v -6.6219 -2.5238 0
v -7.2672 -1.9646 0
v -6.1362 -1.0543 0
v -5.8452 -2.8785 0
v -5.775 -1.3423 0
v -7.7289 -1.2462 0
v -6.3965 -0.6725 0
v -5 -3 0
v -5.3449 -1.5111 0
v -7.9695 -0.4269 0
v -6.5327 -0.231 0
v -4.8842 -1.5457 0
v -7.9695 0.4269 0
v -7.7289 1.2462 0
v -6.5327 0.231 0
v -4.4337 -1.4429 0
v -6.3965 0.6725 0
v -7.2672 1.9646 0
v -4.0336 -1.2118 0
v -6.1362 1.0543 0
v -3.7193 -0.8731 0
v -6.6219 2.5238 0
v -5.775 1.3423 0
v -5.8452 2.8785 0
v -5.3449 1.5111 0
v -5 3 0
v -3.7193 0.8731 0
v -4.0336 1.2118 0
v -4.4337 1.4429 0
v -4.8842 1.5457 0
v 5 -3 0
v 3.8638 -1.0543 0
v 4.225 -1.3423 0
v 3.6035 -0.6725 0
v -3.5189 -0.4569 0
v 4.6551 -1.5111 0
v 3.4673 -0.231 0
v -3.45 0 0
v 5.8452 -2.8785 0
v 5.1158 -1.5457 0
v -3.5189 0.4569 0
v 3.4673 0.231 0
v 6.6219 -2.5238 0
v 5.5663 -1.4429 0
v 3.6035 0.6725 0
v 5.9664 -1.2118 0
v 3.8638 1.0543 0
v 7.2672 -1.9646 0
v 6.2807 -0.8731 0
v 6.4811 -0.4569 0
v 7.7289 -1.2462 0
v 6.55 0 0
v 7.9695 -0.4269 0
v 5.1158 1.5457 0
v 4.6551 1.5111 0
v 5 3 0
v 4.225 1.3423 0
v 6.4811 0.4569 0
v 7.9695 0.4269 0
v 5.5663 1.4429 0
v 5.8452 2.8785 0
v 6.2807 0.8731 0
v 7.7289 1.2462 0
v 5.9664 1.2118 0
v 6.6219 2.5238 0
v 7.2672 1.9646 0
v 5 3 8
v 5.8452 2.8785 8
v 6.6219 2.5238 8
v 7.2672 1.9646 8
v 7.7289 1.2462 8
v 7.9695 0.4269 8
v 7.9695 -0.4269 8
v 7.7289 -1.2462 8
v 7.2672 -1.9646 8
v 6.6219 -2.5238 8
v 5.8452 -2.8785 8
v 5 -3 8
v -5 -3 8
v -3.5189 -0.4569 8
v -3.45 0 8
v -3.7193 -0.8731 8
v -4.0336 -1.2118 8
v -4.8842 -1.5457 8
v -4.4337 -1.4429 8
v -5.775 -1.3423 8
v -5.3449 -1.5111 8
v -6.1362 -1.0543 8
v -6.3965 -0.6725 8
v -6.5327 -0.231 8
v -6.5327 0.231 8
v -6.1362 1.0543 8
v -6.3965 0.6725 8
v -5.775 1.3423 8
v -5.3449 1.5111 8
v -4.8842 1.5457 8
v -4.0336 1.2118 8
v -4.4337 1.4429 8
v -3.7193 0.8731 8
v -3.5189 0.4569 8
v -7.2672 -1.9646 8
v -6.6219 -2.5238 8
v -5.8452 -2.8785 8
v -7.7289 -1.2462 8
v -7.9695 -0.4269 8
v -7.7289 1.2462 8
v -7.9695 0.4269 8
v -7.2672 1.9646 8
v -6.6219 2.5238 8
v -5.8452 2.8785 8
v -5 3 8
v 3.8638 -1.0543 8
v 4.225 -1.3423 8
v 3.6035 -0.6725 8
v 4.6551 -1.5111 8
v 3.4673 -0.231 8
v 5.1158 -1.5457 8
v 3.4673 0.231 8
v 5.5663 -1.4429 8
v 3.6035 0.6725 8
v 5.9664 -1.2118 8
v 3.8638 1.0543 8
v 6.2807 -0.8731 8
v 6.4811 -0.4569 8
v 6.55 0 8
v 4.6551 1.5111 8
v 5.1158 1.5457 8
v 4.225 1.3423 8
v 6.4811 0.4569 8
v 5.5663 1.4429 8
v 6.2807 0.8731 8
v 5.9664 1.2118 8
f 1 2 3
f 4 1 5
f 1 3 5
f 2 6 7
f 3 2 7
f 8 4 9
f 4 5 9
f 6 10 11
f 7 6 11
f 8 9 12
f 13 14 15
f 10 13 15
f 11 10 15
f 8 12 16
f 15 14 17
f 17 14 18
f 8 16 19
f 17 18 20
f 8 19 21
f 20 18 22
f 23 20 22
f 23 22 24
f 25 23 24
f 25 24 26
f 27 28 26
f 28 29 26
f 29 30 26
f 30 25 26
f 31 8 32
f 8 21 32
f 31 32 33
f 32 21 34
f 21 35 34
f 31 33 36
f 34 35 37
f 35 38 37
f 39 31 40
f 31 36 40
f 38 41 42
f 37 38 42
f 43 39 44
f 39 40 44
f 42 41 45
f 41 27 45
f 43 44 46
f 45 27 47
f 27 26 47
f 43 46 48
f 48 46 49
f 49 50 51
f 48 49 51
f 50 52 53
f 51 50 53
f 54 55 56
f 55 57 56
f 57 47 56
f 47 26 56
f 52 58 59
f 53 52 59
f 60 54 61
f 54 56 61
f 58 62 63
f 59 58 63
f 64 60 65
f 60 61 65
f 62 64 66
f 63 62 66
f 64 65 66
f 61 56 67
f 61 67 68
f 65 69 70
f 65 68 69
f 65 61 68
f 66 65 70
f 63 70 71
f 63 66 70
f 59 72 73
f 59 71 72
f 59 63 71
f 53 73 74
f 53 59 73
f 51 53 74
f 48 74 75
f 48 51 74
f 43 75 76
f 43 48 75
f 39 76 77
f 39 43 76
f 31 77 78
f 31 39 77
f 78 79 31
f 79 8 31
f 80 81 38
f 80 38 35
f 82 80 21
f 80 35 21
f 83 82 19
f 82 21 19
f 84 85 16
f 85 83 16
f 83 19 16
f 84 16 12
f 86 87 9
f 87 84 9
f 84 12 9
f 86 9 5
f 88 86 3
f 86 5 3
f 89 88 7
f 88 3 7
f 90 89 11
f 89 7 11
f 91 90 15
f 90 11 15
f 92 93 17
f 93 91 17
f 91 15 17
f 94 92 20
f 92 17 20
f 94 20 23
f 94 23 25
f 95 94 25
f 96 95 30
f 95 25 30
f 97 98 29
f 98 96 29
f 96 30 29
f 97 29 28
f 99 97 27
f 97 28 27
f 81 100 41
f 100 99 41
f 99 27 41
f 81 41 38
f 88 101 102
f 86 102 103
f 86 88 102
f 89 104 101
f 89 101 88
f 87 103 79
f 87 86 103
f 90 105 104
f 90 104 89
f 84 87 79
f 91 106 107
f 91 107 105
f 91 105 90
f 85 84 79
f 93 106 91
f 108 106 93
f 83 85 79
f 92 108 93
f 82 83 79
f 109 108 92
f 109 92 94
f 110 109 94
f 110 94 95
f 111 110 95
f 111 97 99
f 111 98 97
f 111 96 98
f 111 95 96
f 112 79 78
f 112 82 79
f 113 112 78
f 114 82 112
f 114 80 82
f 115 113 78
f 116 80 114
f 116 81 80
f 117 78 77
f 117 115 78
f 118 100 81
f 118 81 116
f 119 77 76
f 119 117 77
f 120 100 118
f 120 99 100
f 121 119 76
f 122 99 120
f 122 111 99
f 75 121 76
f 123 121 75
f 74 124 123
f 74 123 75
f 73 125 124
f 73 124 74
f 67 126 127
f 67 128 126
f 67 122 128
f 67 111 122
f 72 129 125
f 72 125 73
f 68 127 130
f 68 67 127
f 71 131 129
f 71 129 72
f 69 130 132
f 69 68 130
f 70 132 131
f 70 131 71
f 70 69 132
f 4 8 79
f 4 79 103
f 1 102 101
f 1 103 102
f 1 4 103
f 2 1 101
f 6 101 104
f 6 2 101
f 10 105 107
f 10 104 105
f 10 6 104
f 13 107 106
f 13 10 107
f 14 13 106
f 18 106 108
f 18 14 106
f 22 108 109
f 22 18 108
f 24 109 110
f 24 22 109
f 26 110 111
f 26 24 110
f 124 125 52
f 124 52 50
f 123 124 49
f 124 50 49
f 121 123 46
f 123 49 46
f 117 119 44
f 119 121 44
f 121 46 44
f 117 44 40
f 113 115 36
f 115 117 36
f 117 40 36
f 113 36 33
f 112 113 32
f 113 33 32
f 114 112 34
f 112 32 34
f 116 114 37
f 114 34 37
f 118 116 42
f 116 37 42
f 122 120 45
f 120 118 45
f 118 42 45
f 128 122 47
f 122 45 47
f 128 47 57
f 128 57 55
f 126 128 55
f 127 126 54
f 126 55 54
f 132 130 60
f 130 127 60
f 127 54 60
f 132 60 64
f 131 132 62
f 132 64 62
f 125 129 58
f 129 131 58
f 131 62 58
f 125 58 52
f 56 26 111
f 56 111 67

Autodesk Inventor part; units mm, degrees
ref_plane "YZ Plane" through (0, 0, 0) normal (1, 0, 0) x (0, 1, 0)
ref_plane "XZ Plane" through (0, 0, 0) normal (0, 1, 0) x (-1, 0, 0)
ref_plane "XY Plane" through (0, 0, 0) normal (0, 0, 1) x (1, 0, 0)
sketch "スケッチ1" plane through (0, 0, 0) normal (0, 0, 1) x (1, 0, 0)
  circle A0 centre (-5, 0) radius 1.55
  line L0 (0, 0) -> (-5, 0) construction
  line L1 (0, 0) -> (5, 0) construction
  circle A1 centre (5, 0) radius 1.55
  line L2 (-5, 3) -> (5, 3)
  arc A2 (-5, 3) -> (-5, -3) centre (-5, 0) ccw
  line L3 (-5, -3) -> (5, -3)
  arc A3 (5, -3) -> (5, 3) centre (5, 0) ccw
  dimension "d0" = 5
  dimension "d1" = 3.1
  dimension "d2" = 3
extrude "押し出し1" add sketch "スケッチ1" along normal blind 8
properties part number "胴体_サブフレーム_1_8" material "アセタール樹脂、黒"
